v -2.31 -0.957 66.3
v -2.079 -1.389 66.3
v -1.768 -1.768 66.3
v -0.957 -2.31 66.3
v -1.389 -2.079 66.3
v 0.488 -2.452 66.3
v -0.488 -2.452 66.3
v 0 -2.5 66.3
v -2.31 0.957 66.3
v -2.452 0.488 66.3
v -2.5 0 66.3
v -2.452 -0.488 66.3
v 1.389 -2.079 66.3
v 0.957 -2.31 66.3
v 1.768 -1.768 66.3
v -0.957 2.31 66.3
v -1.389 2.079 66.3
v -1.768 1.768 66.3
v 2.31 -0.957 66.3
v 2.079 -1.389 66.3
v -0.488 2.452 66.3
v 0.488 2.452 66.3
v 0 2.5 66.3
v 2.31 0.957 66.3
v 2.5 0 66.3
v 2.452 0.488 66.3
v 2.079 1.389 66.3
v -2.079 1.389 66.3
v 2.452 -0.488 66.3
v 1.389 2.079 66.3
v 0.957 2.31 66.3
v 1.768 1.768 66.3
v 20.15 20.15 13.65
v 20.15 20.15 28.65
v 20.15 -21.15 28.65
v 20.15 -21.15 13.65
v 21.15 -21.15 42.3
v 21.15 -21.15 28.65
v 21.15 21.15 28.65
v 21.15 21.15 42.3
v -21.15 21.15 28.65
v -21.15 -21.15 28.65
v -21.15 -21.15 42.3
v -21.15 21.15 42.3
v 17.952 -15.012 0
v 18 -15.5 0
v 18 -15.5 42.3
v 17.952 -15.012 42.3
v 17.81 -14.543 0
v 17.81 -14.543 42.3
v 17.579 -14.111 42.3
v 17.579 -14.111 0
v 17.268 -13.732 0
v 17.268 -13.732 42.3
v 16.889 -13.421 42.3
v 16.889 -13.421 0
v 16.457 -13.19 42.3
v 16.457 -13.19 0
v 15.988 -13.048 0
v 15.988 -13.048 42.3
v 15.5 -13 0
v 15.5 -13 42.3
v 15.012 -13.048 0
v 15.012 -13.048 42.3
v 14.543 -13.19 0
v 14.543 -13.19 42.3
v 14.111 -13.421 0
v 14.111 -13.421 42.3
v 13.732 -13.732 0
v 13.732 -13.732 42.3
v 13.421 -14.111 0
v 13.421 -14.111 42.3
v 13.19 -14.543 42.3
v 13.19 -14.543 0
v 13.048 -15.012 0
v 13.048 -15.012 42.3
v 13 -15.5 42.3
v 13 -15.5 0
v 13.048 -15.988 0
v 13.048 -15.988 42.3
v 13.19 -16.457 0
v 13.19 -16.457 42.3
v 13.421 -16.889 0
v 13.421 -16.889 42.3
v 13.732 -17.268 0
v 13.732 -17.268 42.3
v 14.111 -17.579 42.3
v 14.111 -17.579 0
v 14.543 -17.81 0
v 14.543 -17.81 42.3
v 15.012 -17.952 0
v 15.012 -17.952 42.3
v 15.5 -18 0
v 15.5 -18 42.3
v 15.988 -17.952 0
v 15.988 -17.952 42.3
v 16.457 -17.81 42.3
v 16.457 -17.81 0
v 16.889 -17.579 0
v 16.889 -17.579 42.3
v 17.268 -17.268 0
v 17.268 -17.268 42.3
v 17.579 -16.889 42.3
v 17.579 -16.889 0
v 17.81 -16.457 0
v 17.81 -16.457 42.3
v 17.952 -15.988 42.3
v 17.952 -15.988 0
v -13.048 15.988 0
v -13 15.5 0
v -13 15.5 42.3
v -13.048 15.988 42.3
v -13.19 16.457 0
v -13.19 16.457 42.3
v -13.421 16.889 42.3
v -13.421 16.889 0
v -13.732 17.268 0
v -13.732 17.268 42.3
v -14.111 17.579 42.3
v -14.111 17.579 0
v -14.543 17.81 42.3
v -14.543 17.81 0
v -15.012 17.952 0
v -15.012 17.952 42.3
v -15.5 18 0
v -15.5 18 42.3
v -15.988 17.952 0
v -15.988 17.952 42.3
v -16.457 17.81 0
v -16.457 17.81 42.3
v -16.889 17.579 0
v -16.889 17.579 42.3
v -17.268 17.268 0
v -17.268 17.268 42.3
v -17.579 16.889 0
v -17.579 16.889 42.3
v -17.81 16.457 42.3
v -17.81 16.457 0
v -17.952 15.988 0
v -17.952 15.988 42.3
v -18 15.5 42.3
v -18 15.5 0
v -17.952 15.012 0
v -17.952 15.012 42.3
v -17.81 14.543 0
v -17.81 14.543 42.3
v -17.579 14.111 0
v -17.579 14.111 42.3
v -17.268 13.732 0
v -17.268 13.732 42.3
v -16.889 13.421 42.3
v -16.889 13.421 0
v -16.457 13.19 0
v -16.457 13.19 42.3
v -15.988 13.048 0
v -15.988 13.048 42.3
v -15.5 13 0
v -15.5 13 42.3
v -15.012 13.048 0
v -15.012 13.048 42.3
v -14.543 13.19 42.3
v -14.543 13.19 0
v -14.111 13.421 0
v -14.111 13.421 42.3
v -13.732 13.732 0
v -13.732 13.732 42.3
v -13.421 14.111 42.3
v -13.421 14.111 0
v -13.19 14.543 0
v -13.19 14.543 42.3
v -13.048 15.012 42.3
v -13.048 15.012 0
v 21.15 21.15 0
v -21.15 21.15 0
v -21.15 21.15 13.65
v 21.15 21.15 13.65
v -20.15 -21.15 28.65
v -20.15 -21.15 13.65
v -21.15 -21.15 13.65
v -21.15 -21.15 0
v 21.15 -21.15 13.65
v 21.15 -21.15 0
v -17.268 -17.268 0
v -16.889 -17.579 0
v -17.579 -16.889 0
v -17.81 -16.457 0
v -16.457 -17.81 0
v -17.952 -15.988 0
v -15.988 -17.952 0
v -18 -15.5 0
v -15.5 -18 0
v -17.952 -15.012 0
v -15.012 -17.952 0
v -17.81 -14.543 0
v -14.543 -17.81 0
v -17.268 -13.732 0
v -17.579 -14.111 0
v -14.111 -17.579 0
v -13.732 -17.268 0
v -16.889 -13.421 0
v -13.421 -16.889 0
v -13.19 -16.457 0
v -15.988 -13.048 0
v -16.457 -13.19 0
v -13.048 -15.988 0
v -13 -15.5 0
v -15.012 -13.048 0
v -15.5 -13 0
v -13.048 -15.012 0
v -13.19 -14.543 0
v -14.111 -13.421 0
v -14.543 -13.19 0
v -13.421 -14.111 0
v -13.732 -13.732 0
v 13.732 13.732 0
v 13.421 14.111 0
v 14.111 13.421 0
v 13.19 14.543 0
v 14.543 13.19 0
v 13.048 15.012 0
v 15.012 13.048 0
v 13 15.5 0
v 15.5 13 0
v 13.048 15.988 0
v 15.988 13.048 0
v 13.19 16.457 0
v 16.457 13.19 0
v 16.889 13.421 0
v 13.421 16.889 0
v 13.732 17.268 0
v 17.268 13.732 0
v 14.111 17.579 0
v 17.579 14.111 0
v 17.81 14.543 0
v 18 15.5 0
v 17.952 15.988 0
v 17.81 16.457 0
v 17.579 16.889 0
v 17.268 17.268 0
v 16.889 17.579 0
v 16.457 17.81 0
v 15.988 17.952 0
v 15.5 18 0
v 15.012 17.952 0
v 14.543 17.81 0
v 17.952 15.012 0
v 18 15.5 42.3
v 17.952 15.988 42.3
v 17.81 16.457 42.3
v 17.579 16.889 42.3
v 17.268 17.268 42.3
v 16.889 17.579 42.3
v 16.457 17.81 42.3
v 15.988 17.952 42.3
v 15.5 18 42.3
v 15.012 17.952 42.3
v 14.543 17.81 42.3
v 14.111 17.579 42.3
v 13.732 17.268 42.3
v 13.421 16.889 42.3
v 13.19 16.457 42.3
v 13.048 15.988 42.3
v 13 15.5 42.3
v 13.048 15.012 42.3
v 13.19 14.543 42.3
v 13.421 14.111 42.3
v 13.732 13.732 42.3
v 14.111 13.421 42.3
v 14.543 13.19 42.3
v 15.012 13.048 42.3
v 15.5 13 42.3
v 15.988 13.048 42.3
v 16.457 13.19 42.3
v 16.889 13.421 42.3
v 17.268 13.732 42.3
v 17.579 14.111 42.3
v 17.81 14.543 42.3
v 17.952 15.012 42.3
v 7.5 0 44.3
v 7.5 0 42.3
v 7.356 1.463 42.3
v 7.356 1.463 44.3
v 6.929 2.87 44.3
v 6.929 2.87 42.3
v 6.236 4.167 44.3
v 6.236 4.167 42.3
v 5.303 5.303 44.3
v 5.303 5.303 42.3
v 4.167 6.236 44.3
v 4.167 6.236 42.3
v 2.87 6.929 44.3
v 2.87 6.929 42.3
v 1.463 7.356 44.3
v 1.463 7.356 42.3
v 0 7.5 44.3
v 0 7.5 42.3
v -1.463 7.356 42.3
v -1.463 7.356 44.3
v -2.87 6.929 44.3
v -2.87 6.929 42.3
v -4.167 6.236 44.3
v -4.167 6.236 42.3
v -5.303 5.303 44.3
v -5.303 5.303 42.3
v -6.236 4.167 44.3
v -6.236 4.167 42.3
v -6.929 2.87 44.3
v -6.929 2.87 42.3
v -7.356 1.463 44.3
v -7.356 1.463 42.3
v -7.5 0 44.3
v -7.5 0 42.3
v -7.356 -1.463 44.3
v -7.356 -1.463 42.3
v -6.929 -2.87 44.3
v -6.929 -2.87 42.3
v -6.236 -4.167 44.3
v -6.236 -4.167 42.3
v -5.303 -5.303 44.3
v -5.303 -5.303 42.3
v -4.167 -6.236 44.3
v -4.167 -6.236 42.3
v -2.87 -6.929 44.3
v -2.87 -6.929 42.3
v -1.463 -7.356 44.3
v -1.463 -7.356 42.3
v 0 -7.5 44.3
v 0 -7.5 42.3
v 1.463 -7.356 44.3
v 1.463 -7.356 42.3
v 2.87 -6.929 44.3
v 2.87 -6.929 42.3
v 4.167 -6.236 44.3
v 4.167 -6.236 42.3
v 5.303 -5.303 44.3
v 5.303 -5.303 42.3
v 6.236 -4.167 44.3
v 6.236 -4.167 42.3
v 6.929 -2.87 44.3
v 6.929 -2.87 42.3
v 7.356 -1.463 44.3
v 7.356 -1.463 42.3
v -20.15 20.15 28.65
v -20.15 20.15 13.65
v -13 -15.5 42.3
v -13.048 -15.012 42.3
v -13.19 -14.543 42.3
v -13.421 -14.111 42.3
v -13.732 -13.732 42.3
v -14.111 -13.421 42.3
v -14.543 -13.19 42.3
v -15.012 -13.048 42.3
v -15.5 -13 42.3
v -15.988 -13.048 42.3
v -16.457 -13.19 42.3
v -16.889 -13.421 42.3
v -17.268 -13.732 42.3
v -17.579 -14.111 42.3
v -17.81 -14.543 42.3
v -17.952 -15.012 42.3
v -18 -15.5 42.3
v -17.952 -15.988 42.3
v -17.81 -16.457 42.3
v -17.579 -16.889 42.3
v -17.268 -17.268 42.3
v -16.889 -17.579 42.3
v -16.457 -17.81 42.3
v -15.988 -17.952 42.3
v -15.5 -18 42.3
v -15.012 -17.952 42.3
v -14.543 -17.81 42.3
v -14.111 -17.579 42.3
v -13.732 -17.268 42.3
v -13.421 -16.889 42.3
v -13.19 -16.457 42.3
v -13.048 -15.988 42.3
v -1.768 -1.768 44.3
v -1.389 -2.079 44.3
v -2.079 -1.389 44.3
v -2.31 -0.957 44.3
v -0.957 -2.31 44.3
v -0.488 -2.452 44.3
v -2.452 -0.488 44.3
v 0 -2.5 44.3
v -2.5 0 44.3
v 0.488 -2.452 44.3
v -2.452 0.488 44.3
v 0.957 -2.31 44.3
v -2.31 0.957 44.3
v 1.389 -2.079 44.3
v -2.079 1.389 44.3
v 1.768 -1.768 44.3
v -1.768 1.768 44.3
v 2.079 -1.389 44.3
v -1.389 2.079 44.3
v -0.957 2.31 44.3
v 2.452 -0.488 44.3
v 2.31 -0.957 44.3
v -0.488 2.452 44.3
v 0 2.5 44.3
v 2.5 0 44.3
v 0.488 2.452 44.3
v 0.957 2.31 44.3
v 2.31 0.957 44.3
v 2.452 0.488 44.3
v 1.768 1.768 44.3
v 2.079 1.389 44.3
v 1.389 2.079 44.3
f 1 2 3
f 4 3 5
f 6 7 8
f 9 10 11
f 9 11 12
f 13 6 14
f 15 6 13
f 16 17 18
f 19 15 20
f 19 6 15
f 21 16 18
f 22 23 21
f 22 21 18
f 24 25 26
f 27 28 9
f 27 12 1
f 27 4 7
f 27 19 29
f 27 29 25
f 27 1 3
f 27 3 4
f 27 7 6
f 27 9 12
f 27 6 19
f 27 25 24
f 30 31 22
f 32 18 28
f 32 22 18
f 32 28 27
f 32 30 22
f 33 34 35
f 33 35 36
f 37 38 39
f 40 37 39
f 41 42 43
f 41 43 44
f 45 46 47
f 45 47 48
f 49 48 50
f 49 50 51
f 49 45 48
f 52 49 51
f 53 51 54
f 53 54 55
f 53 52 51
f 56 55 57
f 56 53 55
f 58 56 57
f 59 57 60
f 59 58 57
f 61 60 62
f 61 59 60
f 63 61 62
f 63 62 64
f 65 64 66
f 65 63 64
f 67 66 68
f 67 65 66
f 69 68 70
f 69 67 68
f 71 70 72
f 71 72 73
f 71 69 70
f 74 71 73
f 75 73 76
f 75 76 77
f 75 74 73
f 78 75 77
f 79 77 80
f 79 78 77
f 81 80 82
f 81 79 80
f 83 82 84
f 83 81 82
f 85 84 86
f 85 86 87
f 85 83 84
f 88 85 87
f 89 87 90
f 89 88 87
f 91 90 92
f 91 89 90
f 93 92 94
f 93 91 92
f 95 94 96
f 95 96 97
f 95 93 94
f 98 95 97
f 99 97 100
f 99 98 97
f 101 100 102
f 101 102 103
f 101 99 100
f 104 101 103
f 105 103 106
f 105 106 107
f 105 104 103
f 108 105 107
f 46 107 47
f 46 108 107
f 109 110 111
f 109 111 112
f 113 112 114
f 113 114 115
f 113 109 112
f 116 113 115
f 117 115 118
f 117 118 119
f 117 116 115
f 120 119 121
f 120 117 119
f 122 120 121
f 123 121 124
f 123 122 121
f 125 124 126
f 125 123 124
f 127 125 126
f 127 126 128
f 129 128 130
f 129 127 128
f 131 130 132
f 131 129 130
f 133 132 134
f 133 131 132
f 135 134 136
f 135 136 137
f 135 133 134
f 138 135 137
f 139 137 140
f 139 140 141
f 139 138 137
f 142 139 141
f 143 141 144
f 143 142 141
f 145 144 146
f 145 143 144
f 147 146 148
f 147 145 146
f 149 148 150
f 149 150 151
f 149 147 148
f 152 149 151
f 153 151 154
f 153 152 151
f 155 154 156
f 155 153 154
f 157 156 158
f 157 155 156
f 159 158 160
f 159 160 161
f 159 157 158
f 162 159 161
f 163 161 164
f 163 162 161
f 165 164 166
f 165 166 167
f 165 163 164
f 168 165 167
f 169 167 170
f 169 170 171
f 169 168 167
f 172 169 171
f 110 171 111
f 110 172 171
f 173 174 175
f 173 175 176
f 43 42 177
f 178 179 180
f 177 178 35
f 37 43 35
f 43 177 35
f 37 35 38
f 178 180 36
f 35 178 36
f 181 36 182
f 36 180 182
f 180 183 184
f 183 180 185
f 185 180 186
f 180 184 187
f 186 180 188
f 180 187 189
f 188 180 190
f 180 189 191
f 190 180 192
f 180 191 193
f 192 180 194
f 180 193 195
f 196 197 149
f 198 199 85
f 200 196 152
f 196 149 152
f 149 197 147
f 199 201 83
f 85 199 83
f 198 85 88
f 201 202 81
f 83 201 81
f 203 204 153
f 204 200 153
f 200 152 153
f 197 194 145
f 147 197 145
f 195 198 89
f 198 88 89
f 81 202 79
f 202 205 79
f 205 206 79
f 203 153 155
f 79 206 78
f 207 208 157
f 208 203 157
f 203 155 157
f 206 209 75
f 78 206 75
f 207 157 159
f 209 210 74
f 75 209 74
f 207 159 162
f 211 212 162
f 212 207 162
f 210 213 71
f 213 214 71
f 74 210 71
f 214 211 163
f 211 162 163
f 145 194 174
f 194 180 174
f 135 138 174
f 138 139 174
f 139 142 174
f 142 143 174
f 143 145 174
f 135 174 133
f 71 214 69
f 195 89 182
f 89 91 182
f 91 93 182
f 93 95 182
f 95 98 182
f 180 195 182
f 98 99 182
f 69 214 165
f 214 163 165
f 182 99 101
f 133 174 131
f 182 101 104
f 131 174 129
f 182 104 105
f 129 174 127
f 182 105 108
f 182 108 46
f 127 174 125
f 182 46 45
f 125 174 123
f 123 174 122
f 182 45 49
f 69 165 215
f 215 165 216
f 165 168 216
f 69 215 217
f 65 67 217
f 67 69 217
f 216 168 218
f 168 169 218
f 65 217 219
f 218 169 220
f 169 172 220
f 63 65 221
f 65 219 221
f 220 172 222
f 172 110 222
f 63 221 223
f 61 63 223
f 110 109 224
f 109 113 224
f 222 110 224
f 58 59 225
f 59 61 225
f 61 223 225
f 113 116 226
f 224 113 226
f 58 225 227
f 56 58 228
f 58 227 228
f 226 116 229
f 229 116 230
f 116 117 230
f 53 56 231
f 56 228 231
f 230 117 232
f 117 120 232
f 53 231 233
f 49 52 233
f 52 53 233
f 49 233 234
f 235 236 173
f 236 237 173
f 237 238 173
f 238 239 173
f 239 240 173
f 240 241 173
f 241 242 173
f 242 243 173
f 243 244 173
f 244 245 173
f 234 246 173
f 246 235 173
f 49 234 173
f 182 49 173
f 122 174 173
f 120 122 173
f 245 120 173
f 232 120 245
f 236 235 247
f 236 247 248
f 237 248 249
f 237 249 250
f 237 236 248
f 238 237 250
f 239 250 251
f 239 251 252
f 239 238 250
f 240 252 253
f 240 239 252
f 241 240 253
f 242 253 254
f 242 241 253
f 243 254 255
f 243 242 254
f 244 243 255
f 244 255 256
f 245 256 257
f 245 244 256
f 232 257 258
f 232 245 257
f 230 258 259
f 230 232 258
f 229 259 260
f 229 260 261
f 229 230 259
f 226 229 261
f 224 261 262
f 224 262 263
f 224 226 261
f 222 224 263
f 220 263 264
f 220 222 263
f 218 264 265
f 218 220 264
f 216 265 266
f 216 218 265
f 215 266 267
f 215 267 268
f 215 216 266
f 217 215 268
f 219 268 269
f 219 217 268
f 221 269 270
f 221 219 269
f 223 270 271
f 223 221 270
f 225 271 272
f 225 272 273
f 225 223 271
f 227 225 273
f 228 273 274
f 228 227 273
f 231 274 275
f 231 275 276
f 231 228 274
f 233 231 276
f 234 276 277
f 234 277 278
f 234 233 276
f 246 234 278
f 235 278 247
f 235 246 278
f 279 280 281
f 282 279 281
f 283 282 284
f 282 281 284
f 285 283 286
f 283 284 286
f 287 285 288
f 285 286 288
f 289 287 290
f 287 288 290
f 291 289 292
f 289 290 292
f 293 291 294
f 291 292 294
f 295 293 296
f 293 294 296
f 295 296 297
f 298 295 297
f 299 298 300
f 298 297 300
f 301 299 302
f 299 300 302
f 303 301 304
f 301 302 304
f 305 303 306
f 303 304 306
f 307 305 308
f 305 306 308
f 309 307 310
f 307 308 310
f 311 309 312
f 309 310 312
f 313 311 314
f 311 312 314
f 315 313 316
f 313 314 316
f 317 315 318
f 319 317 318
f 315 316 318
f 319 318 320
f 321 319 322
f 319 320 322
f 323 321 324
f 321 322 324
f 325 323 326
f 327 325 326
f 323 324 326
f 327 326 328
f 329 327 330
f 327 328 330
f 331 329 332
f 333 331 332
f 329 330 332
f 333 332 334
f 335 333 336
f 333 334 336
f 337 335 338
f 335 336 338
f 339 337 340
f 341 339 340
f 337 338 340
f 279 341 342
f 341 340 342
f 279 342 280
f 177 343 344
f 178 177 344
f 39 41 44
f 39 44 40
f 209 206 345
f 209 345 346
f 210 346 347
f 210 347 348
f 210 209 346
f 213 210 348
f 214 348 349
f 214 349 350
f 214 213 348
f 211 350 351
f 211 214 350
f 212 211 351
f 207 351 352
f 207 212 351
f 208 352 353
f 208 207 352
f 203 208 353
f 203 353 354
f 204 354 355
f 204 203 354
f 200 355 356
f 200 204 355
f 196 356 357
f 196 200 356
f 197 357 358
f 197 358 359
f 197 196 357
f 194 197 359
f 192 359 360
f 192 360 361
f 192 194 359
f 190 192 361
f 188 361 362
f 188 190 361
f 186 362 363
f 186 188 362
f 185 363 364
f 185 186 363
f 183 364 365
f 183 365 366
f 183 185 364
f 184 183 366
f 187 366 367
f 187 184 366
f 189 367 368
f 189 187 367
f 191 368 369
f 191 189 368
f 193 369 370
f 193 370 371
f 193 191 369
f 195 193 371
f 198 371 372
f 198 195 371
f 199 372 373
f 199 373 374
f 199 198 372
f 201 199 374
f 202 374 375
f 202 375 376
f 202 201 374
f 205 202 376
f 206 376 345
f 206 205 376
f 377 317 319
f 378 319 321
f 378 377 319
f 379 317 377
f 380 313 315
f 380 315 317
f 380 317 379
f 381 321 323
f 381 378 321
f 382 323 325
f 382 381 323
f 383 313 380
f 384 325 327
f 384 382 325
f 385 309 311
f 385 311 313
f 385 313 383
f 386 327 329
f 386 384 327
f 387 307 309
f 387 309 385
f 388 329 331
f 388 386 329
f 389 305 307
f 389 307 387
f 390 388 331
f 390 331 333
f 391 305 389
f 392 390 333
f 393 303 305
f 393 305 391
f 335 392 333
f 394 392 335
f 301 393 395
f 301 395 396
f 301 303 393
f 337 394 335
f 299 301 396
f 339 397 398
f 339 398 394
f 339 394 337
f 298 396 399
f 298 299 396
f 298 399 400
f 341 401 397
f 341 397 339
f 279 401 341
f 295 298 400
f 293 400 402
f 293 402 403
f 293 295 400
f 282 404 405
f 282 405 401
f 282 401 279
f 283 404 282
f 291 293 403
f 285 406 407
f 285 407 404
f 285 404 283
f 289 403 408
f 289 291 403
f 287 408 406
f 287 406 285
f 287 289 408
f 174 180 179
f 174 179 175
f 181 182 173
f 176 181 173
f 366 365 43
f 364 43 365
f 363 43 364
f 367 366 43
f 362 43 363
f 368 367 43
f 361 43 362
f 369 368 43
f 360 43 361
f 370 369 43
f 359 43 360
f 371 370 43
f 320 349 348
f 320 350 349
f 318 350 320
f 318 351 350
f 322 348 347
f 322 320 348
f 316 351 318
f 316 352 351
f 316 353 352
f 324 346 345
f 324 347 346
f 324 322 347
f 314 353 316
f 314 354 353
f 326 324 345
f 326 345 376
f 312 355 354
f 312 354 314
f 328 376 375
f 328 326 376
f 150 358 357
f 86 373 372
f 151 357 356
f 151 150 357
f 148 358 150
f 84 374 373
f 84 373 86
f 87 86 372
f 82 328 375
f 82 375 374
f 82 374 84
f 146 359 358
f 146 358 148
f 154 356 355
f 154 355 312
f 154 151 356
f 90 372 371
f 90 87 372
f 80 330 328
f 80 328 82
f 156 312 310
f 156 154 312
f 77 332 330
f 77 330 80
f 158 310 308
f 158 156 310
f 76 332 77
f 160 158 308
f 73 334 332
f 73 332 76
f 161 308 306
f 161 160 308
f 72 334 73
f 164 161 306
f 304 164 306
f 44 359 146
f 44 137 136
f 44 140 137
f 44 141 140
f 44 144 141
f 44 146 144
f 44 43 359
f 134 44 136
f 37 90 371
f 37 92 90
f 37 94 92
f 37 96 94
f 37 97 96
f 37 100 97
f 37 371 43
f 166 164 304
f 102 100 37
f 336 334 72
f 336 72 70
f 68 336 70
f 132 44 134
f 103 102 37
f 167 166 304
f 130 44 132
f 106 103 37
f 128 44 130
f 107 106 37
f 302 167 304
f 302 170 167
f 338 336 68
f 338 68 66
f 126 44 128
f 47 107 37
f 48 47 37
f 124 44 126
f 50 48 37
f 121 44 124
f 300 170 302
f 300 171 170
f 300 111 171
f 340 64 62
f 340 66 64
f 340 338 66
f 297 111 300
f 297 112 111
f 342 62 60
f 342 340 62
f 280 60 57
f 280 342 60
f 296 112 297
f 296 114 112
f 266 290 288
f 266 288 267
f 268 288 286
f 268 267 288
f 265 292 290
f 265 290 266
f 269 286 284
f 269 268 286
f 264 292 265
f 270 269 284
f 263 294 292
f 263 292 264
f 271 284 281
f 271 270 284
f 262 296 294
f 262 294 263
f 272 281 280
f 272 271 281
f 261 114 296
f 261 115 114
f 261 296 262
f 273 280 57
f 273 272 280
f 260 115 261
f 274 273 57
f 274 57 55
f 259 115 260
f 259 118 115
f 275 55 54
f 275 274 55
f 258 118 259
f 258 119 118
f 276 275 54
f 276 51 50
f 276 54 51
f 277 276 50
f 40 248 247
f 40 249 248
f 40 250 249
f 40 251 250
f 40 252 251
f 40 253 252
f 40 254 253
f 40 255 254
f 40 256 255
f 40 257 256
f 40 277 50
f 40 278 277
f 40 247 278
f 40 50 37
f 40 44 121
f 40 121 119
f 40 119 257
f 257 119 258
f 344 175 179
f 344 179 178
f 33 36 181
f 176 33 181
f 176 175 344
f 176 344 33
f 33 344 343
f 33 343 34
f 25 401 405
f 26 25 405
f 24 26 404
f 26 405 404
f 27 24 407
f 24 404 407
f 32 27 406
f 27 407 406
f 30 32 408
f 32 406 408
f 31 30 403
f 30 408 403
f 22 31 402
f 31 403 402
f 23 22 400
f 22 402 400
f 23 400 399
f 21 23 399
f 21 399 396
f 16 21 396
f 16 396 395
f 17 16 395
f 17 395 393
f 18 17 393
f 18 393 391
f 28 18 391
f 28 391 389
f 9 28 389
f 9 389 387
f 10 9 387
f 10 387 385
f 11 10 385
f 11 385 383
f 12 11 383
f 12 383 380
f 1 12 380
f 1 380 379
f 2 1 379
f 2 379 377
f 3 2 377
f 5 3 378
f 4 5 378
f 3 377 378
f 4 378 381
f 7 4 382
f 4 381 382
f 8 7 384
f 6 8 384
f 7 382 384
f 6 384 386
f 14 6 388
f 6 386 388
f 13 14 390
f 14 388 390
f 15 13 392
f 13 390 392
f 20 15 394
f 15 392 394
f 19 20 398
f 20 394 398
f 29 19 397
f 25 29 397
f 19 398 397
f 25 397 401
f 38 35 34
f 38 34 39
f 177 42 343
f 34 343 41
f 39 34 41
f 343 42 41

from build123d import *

# Parameters (mm, degrees)
SKETCH1_W           = 42.3
SKETCH1_H           = 42.3
SKETCH1_R           = 2.5
BOSS_EXTRUDE1_DEPTH = 42.3
SKETCH2_R           = 2.5
BOSS_EXTRUDE2_DEPTH = 24
SKETCH3_R           = 7.5
BOSS_EXTRUDE3_DEPTH = 2
SKETCH4_W           = 15
SKETCH4_H           = 42.3
CUT_EXTRUDE1_DEPTH  = 1
SKETCH5_W           = 41.3
SKETCH5_H           = 15
CUT_EXTRUDE2_DEPTH  = 1


with BuildPart() as part:
    # Sketch1 → Boss-Extrude1 (new body)
    with BuildSketch(Plane.XY):
        Rectangle(SKETCH1_W, SKETCH1_H)
        with Locations((-15.5, 15.5)):
            Circle(SKETCH1_R, mode=Mode.SUBTRACT)
        with Locations((15.5, 15.5)):
            Circle(SKETCH1_R, mode=Mode.SUBTRACT)
        with Locations((15.5, -15.5)):
            Circle(SKETCH1_R, mode=Mode.SUBTRACT)
        with Locations((-15.5, -15.5)):
            Circle(SKETCH1_R, mode=Mode.SUBTRACT)
    extrude(amount=BOSS_EXTRUDE1_DEPTH)

    # Sketch2 → Boss-Extrude2 (add)
    with BuildSketch(Plane.XY.offset(42.3)):
        Circle(SKETCH2_R)
    extrude(amount=BOSS_EXTRUDE2_DEPTH)

    # Sketch3 → Boss-Extrude3 (add)
    with BuildSketch(Plane.XY.offset(42.3)):
        Circle(SKETCH3_R)
    extrude(amount=BOSS_EXTRUDE3_DEPTH)

    # Sketch4 → Cut-Extrude1 (cut)
    with BuildSketch(Plane(origin=(21.15, 0, 0), x_dir=(0, 0, -1), z_dir=(1, 0, 0))):
        with Locations((-21.15, 0)):
            Rectangle(SKETCH4_W, SKETCH4_H)
    cut_extrude1 = extrude(amount=-CUT_EXTRUDE1_DEPTH, mode=Mode.SUBTRACT)

    # Sketch5 → Cut-Extrude2 (cut)
    with BuildSketch(Plane(origin=(0, 21.15, 0), x_dir=(1, 0, 0), z_dir=(0, 1, 0))):
        with Locations((-0.5, -21.15)):
            Rectangle(SKETCH5_W, SKETCH5_H)
    extrude(amount=-CUT_EXTRUDE2_DEPTH, mode=Mode.SUBTRACT)

    # Mirror1: Cut-Extrude1 across plane
    add(cut_extrude1.mirror(Plane(origin=(0, 0, 0), x_dir=(0, 0, 1), z_dir=(1, 0, 0))), mode=Mode.SUBTRACT)


solid = part.part
